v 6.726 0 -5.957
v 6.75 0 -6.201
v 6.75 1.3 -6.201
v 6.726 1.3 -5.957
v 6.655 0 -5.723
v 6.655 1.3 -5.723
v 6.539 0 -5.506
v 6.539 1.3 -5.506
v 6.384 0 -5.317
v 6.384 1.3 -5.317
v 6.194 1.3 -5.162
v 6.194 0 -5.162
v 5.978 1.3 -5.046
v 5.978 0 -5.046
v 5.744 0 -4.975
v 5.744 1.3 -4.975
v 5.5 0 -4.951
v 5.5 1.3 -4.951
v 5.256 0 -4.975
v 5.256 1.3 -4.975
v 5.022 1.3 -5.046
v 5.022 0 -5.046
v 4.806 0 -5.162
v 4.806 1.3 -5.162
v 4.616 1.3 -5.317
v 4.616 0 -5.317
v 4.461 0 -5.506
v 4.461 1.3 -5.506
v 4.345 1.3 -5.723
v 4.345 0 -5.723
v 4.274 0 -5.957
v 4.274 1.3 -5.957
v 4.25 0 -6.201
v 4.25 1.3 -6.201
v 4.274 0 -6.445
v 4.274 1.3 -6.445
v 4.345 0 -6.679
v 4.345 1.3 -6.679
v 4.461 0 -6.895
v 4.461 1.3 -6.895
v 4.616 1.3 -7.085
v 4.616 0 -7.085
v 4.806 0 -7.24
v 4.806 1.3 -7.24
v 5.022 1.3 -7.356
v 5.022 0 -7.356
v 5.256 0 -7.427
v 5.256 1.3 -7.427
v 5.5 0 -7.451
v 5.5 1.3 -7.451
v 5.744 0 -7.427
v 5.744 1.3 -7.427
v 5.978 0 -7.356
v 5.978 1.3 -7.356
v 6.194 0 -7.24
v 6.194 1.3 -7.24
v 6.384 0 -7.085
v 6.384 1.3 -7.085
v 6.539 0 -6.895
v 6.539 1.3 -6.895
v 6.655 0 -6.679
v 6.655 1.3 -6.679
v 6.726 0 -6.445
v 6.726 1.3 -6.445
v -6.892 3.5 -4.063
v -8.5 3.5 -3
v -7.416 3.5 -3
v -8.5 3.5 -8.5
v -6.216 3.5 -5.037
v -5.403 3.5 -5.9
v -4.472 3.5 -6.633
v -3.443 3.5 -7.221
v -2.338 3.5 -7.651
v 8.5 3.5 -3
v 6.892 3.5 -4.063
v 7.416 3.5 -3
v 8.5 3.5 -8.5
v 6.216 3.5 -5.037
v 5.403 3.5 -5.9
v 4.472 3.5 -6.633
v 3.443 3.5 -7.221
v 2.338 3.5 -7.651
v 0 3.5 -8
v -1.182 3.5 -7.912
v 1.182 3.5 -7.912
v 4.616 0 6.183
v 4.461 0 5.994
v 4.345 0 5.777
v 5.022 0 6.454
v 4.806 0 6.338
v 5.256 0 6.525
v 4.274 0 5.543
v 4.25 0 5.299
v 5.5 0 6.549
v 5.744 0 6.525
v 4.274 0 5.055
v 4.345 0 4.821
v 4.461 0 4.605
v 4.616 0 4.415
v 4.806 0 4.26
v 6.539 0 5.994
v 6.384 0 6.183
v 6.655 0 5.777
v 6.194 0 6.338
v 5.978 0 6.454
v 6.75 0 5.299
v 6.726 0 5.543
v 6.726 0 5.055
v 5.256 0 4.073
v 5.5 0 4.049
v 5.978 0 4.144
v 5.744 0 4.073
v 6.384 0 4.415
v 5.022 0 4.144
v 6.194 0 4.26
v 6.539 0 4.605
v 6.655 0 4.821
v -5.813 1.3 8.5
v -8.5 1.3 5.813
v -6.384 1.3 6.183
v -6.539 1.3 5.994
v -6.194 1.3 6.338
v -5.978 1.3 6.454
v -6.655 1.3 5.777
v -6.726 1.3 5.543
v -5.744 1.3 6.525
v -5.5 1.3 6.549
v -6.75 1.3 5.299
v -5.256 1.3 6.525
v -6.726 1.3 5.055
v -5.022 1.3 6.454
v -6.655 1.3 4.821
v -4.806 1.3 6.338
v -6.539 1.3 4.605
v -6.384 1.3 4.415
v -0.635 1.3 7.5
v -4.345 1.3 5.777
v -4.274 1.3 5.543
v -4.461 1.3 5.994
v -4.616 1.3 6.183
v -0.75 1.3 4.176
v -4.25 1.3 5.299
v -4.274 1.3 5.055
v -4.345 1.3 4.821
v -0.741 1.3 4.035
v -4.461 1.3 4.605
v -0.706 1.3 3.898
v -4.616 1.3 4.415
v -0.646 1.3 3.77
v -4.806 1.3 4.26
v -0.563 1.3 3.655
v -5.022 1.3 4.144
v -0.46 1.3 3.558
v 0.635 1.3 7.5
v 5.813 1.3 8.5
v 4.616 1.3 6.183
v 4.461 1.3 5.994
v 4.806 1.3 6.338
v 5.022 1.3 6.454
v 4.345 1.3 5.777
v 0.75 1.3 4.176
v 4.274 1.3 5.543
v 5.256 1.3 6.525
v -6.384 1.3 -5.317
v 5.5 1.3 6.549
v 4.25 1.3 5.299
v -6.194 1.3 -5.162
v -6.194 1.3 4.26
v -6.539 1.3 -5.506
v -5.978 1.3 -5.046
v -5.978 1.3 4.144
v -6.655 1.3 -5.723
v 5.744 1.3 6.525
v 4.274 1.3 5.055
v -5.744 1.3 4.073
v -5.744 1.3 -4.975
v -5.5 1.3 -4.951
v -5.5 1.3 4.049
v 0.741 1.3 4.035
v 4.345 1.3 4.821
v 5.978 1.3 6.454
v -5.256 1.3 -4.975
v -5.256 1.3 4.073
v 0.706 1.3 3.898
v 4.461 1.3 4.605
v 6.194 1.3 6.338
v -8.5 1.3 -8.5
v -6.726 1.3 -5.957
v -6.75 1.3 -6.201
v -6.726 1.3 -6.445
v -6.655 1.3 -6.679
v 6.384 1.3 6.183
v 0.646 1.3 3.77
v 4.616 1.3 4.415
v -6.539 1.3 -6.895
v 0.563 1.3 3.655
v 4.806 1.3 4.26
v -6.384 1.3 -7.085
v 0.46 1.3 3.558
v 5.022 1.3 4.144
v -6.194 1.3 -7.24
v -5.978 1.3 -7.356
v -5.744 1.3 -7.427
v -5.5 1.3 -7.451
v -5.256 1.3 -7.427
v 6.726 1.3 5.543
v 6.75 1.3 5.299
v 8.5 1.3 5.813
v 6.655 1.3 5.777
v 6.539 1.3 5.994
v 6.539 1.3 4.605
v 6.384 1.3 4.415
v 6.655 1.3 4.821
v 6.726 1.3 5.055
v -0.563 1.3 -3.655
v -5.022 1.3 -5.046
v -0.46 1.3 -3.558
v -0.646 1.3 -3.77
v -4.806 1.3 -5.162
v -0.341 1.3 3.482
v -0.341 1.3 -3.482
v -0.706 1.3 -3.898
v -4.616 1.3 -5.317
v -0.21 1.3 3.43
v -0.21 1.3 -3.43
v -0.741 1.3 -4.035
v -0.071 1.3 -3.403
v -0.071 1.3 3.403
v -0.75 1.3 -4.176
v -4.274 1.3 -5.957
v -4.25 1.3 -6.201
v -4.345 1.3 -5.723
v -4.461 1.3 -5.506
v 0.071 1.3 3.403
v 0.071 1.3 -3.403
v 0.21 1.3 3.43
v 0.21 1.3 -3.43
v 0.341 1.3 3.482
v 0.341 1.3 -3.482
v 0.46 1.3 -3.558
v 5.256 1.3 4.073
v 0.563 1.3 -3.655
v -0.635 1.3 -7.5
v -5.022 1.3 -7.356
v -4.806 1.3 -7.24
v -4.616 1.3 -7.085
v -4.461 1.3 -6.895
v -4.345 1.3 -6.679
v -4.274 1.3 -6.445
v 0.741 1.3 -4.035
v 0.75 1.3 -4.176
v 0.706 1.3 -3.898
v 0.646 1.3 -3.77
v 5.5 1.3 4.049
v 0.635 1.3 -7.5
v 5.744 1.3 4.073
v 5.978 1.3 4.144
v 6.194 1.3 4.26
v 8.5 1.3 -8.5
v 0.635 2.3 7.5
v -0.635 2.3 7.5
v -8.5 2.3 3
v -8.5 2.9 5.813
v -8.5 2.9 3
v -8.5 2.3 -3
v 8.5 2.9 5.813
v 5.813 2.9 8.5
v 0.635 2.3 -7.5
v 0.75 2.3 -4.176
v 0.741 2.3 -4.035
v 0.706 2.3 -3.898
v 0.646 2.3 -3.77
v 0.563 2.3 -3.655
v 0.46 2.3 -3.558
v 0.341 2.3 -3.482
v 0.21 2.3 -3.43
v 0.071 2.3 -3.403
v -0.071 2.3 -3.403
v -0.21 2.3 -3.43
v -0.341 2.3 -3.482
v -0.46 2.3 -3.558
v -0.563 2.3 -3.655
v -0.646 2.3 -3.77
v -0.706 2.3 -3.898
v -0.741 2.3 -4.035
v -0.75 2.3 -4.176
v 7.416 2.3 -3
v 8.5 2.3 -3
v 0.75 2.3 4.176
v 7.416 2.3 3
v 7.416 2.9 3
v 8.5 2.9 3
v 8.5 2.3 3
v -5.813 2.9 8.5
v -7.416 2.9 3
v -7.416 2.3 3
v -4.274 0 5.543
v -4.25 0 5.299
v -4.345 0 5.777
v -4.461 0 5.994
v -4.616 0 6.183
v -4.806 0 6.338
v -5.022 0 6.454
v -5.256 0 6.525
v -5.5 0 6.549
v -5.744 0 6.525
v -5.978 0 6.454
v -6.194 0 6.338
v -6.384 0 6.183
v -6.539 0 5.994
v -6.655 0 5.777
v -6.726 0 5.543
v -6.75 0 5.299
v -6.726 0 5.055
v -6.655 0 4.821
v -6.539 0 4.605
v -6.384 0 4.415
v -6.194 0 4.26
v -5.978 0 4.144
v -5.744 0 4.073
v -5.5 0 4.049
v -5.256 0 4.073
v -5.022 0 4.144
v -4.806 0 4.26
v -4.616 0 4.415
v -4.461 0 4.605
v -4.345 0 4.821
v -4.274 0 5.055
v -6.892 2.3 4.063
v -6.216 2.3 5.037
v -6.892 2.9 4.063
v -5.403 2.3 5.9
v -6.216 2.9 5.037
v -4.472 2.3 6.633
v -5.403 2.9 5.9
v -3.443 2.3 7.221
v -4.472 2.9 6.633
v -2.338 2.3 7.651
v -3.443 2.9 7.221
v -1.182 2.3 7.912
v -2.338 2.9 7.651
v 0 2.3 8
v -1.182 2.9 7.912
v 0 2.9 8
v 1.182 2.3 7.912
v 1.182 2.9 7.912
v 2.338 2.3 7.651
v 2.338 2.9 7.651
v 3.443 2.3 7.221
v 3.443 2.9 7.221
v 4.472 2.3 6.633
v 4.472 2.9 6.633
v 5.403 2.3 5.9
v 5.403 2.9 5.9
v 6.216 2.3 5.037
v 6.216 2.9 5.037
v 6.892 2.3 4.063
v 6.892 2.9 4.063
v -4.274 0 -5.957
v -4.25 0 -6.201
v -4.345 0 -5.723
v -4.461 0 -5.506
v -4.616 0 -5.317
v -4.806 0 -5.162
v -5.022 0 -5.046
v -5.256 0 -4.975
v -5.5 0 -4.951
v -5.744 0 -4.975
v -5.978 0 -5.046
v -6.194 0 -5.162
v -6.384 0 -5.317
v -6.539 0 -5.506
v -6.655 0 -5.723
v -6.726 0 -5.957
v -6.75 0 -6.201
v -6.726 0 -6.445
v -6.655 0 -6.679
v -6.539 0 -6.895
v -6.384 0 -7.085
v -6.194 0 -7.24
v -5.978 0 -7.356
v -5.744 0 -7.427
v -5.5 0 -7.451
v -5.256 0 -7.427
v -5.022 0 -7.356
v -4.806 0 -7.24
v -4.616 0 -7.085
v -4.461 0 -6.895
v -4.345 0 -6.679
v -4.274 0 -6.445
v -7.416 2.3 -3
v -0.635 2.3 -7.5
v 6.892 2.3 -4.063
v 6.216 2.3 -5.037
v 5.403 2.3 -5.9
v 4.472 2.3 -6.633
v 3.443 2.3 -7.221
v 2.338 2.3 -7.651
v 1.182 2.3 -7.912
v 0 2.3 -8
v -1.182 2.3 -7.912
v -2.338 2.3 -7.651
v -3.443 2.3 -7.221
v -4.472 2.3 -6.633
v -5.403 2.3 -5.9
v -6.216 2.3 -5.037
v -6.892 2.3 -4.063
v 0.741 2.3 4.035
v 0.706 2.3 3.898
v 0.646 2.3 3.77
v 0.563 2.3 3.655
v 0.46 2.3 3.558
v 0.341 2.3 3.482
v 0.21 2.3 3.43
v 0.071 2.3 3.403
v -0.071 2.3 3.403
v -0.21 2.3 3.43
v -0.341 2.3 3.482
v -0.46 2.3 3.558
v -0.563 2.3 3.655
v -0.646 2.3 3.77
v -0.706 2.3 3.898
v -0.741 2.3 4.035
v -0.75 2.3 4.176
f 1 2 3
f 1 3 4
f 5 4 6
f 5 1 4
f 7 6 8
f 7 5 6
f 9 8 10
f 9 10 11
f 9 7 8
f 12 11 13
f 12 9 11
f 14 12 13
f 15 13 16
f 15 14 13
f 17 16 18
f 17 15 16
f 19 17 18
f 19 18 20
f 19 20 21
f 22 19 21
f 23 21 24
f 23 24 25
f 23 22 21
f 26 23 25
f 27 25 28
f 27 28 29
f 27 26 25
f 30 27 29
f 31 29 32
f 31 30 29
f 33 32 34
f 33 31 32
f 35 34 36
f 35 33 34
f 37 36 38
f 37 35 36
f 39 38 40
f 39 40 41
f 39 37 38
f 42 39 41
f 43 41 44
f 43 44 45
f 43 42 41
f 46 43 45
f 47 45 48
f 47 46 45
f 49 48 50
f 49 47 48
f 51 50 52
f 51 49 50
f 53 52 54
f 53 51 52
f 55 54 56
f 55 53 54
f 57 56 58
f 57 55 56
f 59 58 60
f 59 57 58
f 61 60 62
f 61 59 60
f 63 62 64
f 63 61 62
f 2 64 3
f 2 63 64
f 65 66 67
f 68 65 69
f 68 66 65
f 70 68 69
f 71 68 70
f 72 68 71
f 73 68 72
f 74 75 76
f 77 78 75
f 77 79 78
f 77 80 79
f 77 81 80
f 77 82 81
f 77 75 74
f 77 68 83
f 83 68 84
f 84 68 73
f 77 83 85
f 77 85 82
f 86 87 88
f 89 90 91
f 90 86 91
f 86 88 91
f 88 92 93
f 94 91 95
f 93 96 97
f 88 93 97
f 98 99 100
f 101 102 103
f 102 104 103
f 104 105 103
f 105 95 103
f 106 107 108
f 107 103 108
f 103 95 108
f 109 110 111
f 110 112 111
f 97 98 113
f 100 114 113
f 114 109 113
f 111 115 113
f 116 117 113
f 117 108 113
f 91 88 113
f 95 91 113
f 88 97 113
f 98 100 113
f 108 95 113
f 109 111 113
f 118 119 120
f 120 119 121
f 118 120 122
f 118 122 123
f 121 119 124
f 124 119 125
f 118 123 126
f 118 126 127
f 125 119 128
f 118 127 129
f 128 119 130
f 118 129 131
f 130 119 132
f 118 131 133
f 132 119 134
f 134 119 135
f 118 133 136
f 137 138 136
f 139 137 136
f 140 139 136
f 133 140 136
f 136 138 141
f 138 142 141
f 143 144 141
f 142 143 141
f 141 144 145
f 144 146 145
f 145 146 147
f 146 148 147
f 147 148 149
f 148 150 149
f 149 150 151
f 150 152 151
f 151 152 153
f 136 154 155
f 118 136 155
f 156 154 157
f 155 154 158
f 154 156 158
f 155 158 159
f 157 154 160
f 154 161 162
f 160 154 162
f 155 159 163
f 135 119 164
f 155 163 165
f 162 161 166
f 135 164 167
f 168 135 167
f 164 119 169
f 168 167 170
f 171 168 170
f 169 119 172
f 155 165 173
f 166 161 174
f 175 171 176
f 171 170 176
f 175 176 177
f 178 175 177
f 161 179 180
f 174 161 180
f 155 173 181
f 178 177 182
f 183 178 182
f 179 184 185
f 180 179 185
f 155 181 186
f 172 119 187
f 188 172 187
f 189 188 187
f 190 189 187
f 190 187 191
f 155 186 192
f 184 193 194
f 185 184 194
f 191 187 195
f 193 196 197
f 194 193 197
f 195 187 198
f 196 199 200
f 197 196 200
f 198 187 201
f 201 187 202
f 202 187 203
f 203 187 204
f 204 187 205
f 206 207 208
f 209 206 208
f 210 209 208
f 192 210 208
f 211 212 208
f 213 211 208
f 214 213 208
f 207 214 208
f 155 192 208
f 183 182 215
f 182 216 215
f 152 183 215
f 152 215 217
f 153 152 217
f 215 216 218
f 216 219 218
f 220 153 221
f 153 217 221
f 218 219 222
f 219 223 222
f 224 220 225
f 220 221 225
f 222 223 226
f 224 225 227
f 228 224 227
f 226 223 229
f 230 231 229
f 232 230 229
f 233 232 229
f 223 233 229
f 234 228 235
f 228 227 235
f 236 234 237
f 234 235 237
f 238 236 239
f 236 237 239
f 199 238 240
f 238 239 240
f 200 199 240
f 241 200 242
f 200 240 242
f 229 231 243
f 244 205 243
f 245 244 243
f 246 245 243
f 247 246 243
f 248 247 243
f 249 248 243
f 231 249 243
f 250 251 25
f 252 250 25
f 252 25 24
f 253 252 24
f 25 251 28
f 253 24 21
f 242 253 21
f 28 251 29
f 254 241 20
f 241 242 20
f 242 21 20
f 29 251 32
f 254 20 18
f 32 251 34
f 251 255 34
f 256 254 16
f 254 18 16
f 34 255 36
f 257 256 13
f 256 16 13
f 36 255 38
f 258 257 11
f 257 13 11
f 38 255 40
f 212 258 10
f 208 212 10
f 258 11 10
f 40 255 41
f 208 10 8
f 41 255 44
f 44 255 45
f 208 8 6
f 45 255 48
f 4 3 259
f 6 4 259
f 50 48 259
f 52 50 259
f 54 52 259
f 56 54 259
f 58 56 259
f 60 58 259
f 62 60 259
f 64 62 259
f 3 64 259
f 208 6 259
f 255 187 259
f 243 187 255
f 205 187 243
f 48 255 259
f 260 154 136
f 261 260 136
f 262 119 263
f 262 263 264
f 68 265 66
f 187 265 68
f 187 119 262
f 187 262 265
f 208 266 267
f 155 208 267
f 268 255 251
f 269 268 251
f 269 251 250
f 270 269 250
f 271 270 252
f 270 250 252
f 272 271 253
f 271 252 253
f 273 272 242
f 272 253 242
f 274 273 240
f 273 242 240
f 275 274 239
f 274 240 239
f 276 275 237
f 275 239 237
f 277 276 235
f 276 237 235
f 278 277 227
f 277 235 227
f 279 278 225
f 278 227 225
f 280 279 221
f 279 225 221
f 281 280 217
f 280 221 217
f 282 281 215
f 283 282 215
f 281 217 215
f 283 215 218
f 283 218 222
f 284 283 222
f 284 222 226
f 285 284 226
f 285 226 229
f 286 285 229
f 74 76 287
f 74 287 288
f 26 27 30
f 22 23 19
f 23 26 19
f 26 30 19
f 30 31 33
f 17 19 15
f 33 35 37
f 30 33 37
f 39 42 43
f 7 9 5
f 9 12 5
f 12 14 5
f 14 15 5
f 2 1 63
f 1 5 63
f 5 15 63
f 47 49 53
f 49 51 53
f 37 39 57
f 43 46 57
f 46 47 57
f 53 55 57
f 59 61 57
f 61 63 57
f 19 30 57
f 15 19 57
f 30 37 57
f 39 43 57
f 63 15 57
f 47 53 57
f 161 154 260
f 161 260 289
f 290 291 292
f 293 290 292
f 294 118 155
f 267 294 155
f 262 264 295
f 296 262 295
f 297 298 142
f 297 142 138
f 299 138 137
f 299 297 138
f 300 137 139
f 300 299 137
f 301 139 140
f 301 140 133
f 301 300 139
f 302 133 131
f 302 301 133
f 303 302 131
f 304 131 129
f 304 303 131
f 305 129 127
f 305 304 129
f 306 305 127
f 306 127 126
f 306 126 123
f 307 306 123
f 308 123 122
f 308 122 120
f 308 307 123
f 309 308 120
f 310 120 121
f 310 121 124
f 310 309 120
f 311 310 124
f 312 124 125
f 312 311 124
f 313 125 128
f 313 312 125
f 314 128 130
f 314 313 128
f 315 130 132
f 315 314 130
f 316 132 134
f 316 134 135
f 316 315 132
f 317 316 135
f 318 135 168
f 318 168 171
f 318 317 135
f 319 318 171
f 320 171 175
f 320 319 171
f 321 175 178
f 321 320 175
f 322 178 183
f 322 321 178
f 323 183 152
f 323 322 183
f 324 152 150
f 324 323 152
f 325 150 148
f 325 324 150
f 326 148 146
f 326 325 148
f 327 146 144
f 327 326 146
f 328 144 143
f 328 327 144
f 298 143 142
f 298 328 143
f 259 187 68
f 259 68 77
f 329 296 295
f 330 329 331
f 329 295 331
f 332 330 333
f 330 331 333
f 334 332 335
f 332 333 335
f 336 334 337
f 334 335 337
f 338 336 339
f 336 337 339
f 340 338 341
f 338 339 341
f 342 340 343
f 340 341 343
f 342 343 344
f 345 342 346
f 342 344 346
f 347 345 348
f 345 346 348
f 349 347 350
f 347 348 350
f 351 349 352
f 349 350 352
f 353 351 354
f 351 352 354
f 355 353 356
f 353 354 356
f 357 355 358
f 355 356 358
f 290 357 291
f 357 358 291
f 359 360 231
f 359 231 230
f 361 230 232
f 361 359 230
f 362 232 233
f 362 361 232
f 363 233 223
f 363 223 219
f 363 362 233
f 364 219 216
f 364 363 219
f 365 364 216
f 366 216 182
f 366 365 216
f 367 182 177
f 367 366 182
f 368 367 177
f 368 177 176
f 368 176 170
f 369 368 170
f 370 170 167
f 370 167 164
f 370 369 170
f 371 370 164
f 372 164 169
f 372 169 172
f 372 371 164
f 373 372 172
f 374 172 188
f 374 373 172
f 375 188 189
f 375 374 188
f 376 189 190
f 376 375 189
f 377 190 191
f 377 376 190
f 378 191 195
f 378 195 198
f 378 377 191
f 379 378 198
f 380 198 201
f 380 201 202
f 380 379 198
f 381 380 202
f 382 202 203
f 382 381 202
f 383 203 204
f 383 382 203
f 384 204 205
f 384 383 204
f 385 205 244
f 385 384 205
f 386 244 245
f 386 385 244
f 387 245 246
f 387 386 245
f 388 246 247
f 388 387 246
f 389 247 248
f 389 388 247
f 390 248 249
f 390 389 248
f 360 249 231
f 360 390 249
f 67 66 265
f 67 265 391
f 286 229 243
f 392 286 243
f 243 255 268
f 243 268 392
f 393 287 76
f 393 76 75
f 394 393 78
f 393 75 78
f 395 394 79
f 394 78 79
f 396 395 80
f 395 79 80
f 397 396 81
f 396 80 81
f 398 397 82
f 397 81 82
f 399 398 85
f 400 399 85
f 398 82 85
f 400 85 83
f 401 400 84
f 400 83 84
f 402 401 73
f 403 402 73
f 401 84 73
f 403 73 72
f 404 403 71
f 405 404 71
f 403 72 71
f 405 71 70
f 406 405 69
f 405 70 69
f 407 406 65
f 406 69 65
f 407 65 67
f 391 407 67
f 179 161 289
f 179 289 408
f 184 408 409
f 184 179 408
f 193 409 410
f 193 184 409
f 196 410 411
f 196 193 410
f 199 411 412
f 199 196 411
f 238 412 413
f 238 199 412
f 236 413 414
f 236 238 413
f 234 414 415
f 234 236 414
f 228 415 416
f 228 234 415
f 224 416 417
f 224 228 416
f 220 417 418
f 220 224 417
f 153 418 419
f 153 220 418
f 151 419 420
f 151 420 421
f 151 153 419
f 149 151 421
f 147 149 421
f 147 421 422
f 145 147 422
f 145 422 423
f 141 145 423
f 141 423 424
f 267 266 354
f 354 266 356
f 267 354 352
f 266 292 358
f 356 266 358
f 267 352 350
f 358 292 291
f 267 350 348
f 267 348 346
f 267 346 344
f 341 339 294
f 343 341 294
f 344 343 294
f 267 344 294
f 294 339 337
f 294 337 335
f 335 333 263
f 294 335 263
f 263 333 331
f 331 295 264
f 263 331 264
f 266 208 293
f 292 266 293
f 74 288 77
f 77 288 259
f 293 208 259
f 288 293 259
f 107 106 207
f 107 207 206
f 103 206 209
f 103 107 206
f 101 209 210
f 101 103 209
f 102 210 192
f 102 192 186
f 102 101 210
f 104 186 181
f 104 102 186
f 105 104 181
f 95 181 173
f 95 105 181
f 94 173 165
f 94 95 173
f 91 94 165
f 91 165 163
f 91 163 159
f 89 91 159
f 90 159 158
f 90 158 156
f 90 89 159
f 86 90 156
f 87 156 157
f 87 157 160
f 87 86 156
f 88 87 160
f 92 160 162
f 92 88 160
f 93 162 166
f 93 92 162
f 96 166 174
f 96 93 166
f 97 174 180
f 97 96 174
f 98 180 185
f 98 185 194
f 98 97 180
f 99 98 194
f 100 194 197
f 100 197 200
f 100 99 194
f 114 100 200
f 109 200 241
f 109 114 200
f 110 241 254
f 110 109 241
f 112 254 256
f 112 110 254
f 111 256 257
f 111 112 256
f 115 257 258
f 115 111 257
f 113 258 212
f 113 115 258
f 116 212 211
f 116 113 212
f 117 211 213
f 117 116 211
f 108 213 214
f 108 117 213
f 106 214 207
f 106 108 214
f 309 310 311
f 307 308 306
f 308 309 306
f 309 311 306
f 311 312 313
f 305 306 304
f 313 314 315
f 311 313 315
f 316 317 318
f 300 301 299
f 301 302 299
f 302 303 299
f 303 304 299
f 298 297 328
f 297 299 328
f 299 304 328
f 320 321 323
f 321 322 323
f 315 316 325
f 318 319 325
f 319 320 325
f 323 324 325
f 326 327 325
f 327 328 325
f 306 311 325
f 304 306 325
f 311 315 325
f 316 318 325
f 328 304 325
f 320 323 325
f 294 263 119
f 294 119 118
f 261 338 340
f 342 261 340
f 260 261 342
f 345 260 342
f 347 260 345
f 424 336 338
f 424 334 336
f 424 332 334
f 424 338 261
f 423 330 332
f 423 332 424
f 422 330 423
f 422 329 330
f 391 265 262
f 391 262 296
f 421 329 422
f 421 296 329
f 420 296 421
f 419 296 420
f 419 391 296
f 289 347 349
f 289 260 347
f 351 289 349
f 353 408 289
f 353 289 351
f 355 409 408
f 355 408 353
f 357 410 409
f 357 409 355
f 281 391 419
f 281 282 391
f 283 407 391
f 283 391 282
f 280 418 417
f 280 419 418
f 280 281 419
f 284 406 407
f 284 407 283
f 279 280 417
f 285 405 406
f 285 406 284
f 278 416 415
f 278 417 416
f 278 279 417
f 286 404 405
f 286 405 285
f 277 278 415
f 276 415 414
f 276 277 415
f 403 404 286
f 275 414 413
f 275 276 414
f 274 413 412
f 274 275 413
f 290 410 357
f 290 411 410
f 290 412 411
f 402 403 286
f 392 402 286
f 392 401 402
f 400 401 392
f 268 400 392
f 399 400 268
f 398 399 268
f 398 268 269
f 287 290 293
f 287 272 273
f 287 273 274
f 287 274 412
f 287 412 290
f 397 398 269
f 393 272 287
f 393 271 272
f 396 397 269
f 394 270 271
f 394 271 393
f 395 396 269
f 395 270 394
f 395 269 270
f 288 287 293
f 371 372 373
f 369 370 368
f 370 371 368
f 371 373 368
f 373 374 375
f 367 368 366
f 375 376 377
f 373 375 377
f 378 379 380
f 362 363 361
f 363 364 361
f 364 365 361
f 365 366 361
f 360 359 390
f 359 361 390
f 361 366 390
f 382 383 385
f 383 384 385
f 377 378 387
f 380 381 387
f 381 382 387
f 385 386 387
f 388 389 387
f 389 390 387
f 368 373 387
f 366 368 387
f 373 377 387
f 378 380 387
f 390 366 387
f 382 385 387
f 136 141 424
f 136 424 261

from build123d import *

# Parameters (mm, degrees)
SKETCH1_W           = 17
SKETCH1_H           = 17
BOSS_EXTRUDE1_DEPTH = 3.5
CUT_EXTRUDE1_DEPTH  = 4.5
CUT_EXTRUDE2_DEPTH  = 0.6
SKETCH5_W           = 17
SKETCH5_H           = 6
CUT_EXTRUDE3_DEPTH  = 0.6
SKETCH6_R           = 8
CUT_EXTRUDE4_DEPTH  = 1.2
SKETCH7_OUTSIDE_W   = 23.86
SKETCH7_OUTSIDE_H   = 23.86
SKETCH7_OUTSIDE_R   = 1.25
CUT_EXTRUDE5_DEPTH  = 1.3
CUT_EXTRUDE6_DEPTH  = 1
BOSS_EXTRUDE4_DEPTH = 1


with BuildPart() as part:
    # Sketch1 → Boss-Extrude1 (new body)
    with BuildSketch(Plane(origin=(0, 0, 0), x_dir=(1, 0, 0), z_dir=(0, 1, 0))):
        Rectangle(SKETCH1_W, SKETCH1_H)
    extrude(amount=BOSS_EXTRUDE1_DEPTH)

    # Sketch2 → Cut-Extrude1 (cut, through all)
    with BuildSketch(Plane(origin=(0, 3.5, 0), x_dir=(1, 0, 0), z_dir=(0, 1, 0))):
        Polygon((-8.5, -5.812994231), (-5.812994231, -8.5), (-8.5, -8.5), align=None)
    cut_extrude1 = extrude(amount=-CUT_EXTRUDE1_DEPTH, mode=Mode.SUBTRACT)

    # Mirror1: Cut-Extrude1 across plane
    add(cut_extrude1.mirror(Plane(origin=(0, 0, 0), x_dir=(0, 0, 1), z_dir=(1, 0, 0))), mode=Mode.SUBTRACT)

    # Sketch3 → Cut-Extrude2 (cut)
    with BuildSketch(Plane(origin=(0, 3.5, 0), x_dir=(1, 0, 0), z_dir=(0, 1, 0))):
        Polygon((-8.5, 3), (8.5, 3), (8.5, -5.812994231), (5.812994231, -8.5), (-5.812994231, -8.5), (-8.5, -5.812994231), align=None)
    extrude(amount=-CUT_EXTRUDE2_DEPTH, mode=Mode.SUBTRACT)

    # Sketch5 → Cut-Extrude3 (cut)
    with BuildSketch(Plane(origin=(0, 2.9, 0), x_dir=(1, 0, 0), z_dir=(0, 1, 0))):
        Rectangle(SKETCH5_W, SKETCH5_H)
    extrude(amount=-CUT_EXTRUDE3_DEPTH, mode=Mode.SUBTRACT)

    # Sketch6 → Cut-Extrude4 (cut)
    with BuildSketch(Plane(origin=(0, 3.5, 0), x_dir=(1, 0, 0), z_dir=(0, 1, 0))):
        Circle(SKETCH6_R)
    extrude(amount=-CUT_EXTRUDE4_DEPTH, mode=Mode.SUBTRACT)

    # Sketch7 outside → Cut-Extrude5 (cut)
    with BuildSketch(Plane.XZ):
        Rectangle(SKETCH7_OUTSIDE_W, SKETCH7_OUTSIDE_H)
        with Locations((-5.5, -6.20094747)):
            Circle(SKETCH7_OUTSIDE_R, mode=Mode.SUBTRACT)
        with Locations((-5.5, 5.29905253)):
            Circle(SKETCH7_OUTSIDE_R, mode=Mode.SUBTRACT)
        with Locations((5.5, 5.29905253)):
            Circle(SKETCH7_OUTSIDE_R, mode=Mode.SUBTRACT)
        with Locations((5.5, -6.20094747)):
            Circle(SKETCH7_OUTSIDE_R, mode=Mode.SUBTRACT)
    extrude(amount=-CUT_EXTRUDE5_DEPTH, mode=Mode.SUBTRACT)

    # Sketch8 → Cut-Extrude6 (cut)
    with BuildSketch(Plane.XZ.offset(-1.3)):
        with BuildLine():
            Line((-0.6, -8.5), (0.6, -8.5))
            Line((0.6, -8.5), (0.749551834, -4.175923885))
            ThreePointArc((0.749551834, -4.175923885), (0, -3.4), (-0.749551834, -4.175923885))
            Line((-0.749551834, -4.175923885), (-0.6, -8.5))
        make_face()
    cut_extrude6 = extrude(amount=-CUT_EXTRUDE6_DEPTH, mode=Mode.SUBTRACT)

    # Mirror2: Cut-Extrude6 across plane
    add(cut_extrude6.mirror(Plane.XY), mode=Mode.SUBTRACT)

    # Sketch11 → Boss-Extrude4 (add)
    with BuildSketch(Plane.XZ.offset(-1.3)):
        Polygon((-0.6, -8.5), (0.6, -8.5), (0.634585847, -7.5), (-0.634585847, -7.5), align=None)
    boss_extrude4 = extrude(amount=-BOSS_EXTRUDE4_DEPTH)

    # Mirror3: Boss-Extrude4 across plane
    add(boss_extrude4.mirror(Plane.XY))


solid = part.part
